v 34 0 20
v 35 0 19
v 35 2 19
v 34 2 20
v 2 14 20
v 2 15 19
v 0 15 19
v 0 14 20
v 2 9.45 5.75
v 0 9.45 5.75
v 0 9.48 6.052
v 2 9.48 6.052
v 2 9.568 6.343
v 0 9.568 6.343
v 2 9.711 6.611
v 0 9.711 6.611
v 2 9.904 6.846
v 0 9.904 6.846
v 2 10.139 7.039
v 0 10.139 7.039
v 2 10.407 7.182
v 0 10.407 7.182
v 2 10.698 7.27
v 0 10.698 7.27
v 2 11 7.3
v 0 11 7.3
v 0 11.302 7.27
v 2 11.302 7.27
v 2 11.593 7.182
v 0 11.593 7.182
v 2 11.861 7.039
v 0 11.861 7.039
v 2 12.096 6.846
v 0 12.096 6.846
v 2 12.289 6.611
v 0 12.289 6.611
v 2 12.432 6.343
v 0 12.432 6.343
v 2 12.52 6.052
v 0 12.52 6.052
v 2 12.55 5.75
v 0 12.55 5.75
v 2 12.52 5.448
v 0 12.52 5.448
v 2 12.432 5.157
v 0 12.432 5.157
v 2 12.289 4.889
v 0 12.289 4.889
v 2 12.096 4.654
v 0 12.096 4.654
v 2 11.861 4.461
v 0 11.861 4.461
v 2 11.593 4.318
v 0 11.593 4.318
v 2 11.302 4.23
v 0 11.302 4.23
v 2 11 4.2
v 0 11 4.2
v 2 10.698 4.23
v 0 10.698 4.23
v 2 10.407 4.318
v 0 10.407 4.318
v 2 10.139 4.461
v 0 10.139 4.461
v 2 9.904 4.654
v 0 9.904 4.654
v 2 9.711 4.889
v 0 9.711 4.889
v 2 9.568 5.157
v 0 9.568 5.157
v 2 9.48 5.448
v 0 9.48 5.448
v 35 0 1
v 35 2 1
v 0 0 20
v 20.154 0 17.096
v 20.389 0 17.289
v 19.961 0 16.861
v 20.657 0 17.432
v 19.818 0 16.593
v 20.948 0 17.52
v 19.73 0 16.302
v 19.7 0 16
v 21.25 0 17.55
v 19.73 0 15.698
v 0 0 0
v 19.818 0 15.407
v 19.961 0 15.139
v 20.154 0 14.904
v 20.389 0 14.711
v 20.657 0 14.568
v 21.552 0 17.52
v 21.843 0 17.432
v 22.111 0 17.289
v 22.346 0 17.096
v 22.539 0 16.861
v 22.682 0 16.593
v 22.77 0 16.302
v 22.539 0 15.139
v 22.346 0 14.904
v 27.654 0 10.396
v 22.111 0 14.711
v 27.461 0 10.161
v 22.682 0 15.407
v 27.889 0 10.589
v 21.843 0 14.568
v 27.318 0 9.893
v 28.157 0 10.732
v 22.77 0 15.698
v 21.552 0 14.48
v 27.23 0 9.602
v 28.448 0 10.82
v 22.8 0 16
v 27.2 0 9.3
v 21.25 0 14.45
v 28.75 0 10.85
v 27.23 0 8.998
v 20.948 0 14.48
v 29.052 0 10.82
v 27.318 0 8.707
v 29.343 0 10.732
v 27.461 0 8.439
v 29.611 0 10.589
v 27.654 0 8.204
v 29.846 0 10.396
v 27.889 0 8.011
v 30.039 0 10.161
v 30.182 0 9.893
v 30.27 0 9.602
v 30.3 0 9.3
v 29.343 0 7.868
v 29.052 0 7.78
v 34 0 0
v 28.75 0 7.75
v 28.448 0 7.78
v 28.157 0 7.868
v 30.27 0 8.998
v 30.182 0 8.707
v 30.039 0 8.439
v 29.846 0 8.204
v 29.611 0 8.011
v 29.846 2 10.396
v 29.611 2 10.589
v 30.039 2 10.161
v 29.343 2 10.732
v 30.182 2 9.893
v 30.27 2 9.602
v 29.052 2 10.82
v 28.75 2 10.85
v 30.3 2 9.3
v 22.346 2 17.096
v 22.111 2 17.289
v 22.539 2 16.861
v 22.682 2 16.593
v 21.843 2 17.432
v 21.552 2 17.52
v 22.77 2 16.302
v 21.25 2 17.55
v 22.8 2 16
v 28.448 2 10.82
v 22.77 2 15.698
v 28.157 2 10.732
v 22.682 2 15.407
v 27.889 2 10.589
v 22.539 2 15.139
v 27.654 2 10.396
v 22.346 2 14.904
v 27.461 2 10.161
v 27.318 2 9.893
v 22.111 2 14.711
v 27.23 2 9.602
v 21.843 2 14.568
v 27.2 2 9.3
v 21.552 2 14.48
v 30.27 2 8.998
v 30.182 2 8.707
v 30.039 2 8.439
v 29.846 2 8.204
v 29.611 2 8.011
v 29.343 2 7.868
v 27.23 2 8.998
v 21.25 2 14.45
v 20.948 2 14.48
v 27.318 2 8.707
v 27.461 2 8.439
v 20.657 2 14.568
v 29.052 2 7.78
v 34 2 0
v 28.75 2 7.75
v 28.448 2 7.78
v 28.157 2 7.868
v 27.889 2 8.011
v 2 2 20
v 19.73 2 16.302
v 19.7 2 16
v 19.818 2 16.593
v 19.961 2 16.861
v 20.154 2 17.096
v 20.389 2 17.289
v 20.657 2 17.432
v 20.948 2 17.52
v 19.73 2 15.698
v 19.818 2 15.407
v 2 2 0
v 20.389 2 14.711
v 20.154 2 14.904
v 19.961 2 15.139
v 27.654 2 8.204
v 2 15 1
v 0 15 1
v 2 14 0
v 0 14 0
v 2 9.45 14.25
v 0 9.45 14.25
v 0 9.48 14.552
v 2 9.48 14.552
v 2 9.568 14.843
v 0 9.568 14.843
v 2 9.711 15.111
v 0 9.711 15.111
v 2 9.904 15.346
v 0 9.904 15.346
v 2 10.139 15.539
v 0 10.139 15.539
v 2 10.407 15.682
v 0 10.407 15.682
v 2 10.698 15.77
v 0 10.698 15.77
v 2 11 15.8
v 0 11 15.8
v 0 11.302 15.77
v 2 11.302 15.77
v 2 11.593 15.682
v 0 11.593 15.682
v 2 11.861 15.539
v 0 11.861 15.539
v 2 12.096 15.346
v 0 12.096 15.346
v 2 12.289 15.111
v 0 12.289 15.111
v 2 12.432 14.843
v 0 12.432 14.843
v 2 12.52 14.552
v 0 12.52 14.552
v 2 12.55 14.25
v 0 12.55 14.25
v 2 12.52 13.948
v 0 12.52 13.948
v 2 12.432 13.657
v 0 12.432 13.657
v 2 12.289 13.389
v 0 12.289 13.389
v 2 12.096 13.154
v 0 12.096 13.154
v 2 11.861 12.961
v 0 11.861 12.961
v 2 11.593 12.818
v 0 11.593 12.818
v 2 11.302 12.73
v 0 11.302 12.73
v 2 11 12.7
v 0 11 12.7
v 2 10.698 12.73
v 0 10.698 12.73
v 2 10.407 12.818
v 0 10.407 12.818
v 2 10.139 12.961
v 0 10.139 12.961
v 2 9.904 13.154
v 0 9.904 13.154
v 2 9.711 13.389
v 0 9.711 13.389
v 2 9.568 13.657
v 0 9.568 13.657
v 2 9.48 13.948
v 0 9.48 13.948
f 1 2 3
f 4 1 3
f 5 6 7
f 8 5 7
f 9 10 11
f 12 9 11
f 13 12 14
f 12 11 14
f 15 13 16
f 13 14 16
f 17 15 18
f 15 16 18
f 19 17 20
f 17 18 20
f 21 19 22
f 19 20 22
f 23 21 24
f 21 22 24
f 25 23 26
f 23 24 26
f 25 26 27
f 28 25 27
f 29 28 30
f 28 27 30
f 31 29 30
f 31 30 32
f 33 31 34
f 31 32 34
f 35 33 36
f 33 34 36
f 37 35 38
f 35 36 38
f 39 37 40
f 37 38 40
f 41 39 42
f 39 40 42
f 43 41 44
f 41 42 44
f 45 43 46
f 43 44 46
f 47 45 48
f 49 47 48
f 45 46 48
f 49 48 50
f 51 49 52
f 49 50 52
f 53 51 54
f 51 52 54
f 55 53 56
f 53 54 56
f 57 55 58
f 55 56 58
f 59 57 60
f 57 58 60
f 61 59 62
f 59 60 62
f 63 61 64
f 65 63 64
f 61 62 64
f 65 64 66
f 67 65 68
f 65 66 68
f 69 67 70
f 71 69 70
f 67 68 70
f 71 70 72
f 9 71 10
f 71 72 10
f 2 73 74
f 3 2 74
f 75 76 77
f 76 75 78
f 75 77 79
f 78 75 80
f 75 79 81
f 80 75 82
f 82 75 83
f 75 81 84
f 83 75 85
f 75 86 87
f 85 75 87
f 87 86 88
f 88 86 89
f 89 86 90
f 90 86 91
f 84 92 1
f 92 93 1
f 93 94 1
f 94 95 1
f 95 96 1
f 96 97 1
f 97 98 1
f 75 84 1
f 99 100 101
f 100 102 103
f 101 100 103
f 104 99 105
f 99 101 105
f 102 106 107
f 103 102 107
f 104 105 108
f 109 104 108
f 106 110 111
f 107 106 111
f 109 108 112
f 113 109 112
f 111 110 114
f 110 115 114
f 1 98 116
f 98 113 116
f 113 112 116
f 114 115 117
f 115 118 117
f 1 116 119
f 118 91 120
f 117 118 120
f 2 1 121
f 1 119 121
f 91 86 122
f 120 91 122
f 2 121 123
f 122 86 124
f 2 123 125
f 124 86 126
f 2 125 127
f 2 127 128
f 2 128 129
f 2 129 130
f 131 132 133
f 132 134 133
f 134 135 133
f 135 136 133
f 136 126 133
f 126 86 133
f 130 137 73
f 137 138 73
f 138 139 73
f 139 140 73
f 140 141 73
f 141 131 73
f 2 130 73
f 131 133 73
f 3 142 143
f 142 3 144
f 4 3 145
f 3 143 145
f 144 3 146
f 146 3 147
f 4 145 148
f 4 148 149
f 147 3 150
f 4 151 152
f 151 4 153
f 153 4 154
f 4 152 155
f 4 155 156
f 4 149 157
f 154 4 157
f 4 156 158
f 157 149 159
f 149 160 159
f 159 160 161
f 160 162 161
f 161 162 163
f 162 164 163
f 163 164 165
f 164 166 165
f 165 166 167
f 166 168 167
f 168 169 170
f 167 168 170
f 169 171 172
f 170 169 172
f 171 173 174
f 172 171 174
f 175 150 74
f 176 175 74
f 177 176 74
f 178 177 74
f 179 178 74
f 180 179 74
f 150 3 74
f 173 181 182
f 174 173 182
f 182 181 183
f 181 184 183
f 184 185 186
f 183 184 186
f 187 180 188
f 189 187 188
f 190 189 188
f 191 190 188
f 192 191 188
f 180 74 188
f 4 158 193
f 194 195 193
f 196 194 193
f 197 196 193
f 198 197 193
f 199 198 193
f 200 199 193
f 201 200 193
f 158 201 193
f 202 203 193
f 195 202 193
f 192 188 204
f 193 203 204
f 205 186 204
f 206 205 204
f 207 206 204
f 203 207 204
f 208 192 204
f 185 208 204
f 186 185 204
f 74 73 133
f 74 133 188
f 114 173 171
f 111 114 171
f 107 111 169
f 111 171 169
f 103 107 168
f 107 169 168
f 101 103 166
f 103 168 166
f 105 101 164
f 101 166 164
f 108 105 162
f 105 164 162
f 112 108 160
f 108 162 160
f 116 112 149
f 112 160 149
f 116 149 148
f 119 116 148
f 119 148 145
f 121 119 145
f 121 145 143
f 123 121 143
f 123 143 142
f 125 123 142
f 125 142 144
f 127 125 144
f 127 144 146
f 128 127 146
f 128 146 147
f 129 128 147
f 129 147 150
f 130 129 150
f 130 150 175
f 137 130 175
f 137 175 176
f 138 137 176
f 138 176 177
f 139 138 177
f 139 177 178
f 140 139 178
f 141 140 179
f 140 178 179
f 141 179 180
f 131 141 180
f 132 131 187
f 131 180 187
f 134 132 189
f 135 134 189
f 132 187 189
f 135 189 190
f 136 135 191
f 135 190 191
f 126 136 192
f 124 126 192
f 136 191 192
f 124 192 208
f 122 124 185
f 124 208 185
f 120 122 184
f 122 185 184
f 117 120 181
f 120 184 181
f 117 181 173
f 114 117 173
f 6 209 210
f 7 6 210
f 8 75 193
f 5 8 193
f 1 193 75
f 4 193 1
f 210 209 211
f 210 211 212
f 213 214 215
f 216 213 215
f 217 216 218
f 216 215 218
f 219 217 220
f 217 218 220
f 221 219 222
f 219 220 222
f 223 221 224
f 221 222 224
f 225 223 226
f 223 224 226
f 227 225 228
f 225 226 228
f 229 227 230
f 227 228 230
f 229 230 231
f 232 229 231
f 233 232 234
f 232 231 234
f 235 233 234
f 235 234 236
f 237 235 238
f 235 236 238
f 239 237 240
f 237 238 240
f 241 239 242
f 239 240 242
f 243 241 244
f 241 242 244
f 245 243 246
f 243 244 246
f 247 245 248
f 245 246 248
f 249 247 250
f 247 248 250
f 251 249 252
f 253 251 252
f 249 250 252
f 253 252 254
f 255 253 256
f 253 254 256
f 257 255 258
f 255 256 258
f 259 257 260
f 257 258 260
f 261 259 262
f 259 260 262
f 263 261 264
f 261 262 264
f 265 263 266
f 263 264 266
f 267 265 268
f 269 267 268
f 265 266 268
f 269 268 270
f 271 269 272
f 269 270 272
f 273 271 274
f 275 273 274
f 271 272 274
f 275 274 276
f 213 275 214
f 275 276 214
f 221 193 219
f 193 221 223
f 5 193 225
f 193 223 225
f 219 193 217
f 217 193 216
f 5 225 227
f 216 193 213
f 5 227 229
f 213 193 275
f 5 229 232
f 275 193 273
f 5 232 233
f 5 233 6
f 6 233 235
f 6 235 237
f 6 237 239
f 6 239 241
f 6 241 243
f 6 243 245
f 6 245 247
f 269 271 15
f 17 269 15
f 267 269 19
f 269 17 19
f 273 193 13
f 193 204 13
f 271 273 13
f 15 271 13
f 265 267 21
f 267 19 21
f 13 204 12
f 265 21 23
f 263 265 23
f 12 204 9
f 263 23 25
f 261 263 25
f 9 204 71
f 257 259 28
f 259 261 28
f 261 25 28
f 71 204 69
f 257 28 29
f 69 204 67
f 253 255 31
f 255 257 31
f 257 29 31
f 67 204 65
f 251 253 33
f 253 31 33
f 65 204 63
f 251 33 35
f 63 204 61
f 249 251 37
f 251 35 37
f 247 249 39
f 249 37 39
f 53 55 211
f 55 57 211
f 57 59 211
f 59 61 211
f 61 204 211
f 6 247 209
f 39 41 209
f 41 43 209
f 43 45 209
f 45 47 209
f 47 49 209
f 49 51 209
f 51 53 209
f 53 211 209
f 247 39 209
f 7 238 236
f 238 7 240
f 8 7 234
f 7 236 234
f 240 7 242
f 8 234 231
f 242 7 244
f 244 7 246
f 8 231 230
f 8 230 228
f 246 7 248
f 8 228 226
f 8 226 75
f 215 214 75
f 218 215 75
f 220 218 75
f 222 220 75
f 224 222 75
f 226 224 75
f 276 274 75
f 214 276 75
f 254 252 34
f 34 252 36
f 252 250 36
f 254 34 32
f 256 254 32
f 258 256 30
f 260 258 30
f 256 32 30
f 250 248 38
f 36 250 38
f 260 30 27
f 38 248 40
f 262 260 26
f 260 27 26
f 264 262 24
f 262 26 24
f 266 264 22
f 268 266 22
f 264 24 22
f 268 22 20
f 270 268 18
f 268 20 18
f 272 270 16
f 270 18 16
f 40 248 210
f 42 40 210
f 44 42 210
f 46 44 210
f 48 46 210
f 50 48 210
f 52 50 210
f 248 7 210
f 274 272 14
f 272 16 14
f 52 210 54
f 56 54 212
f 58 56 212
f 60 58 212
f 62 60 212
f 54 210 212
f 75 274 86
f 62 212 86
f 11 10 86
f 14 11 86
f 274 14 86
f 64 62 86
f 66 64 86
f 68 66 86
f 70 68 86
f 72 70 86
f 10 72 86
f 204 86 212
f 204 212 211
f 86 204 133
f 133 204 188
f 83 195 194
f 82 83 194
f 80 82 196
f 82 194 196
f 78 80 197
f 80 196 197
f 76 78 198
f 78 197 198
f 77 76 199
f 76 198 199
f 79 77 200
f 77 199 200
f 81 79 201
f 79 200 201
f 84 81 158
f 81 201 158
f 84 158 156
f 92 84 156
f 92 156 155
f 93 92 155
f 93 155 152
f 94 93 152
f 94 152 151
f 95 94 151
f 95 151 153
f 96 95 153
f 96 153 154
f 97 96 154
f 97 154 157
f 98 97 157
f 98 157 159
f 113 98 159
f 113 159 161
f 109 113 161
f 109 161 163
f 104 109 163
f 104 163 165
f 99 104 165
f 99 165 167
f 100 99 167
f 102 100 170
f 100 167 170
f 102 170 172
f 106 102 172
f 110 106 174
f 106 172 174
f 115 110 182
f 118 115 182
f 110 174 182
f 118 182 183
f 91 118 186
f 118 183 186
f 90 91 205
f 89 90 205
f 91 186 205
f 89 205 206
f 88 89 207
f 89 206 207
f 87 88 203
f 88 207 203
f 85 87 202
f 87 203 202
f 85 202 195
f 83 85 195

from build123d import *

# Parameters (mm, degrees)
BASE_DEPTH           = 20
SKETCH2_R            = 1.55
CARRIAGESIDE_DEPTH   = 2
SKETCH5_R            = 1.55
CABLECHAINSIDE_DEPTH = 43.355637169
CHAMFER1_SIZE        = 1


with BuildPart() as part:
    # Sketch1 → Base (new body)
    with BuildSketch(Plane.XY):
        Polygon((0, 0), (35, 0), (35, 2), (2, 2), (2, 15), (0, 15), align=None)
    extrude(amount=BASE_DEPTH)

    # Sketch2 → CarriageSide (cut)
    with BuildSketch(Plane.ZY):
        with Locations(Location((14.25, 11, 0), (0, 0, 270))):
            Circle(SKETCH2_R)
        with Locations(Location((5.75, 11, 0), (0, 0, 270))):
            Circle(SKETCH2_R)
    extrude(amount=-CARRIAGESIDE_DEPTH, mode=Mode.SUBTRACT)

    # Sketch5 → CableChainSide (cut, through all)
    with BuildSketch(Plane(origin=(0, 2, 0), x_dir=(1, 0, 0), z_dir=(0, 1, 0))):
        with Locations(Location((21.25, -16, 0), (0, 0, 180))):
            Circle(SKETCH5_R)
        with Locations(Location((28.75, -9.3, 0), (0, 0, 180))):
            Circle(SKETCH5_R)
    extrude(amount=-CABLECHAINSIDE_DEPTH, mode=Mode.SUBTRACT)

    # Chamfer1
    chamfer1_edges = [part.edges().sort_by_distance(p)[0] for p in [
        (35, 1, 20),
        (1, 15, 20),
        (1, 15, 0),
        (35, 1, 0),
    ]]
    chamfer(chamfer1_edges, length=CHAMFER1_SIZE)


solid = part.part
